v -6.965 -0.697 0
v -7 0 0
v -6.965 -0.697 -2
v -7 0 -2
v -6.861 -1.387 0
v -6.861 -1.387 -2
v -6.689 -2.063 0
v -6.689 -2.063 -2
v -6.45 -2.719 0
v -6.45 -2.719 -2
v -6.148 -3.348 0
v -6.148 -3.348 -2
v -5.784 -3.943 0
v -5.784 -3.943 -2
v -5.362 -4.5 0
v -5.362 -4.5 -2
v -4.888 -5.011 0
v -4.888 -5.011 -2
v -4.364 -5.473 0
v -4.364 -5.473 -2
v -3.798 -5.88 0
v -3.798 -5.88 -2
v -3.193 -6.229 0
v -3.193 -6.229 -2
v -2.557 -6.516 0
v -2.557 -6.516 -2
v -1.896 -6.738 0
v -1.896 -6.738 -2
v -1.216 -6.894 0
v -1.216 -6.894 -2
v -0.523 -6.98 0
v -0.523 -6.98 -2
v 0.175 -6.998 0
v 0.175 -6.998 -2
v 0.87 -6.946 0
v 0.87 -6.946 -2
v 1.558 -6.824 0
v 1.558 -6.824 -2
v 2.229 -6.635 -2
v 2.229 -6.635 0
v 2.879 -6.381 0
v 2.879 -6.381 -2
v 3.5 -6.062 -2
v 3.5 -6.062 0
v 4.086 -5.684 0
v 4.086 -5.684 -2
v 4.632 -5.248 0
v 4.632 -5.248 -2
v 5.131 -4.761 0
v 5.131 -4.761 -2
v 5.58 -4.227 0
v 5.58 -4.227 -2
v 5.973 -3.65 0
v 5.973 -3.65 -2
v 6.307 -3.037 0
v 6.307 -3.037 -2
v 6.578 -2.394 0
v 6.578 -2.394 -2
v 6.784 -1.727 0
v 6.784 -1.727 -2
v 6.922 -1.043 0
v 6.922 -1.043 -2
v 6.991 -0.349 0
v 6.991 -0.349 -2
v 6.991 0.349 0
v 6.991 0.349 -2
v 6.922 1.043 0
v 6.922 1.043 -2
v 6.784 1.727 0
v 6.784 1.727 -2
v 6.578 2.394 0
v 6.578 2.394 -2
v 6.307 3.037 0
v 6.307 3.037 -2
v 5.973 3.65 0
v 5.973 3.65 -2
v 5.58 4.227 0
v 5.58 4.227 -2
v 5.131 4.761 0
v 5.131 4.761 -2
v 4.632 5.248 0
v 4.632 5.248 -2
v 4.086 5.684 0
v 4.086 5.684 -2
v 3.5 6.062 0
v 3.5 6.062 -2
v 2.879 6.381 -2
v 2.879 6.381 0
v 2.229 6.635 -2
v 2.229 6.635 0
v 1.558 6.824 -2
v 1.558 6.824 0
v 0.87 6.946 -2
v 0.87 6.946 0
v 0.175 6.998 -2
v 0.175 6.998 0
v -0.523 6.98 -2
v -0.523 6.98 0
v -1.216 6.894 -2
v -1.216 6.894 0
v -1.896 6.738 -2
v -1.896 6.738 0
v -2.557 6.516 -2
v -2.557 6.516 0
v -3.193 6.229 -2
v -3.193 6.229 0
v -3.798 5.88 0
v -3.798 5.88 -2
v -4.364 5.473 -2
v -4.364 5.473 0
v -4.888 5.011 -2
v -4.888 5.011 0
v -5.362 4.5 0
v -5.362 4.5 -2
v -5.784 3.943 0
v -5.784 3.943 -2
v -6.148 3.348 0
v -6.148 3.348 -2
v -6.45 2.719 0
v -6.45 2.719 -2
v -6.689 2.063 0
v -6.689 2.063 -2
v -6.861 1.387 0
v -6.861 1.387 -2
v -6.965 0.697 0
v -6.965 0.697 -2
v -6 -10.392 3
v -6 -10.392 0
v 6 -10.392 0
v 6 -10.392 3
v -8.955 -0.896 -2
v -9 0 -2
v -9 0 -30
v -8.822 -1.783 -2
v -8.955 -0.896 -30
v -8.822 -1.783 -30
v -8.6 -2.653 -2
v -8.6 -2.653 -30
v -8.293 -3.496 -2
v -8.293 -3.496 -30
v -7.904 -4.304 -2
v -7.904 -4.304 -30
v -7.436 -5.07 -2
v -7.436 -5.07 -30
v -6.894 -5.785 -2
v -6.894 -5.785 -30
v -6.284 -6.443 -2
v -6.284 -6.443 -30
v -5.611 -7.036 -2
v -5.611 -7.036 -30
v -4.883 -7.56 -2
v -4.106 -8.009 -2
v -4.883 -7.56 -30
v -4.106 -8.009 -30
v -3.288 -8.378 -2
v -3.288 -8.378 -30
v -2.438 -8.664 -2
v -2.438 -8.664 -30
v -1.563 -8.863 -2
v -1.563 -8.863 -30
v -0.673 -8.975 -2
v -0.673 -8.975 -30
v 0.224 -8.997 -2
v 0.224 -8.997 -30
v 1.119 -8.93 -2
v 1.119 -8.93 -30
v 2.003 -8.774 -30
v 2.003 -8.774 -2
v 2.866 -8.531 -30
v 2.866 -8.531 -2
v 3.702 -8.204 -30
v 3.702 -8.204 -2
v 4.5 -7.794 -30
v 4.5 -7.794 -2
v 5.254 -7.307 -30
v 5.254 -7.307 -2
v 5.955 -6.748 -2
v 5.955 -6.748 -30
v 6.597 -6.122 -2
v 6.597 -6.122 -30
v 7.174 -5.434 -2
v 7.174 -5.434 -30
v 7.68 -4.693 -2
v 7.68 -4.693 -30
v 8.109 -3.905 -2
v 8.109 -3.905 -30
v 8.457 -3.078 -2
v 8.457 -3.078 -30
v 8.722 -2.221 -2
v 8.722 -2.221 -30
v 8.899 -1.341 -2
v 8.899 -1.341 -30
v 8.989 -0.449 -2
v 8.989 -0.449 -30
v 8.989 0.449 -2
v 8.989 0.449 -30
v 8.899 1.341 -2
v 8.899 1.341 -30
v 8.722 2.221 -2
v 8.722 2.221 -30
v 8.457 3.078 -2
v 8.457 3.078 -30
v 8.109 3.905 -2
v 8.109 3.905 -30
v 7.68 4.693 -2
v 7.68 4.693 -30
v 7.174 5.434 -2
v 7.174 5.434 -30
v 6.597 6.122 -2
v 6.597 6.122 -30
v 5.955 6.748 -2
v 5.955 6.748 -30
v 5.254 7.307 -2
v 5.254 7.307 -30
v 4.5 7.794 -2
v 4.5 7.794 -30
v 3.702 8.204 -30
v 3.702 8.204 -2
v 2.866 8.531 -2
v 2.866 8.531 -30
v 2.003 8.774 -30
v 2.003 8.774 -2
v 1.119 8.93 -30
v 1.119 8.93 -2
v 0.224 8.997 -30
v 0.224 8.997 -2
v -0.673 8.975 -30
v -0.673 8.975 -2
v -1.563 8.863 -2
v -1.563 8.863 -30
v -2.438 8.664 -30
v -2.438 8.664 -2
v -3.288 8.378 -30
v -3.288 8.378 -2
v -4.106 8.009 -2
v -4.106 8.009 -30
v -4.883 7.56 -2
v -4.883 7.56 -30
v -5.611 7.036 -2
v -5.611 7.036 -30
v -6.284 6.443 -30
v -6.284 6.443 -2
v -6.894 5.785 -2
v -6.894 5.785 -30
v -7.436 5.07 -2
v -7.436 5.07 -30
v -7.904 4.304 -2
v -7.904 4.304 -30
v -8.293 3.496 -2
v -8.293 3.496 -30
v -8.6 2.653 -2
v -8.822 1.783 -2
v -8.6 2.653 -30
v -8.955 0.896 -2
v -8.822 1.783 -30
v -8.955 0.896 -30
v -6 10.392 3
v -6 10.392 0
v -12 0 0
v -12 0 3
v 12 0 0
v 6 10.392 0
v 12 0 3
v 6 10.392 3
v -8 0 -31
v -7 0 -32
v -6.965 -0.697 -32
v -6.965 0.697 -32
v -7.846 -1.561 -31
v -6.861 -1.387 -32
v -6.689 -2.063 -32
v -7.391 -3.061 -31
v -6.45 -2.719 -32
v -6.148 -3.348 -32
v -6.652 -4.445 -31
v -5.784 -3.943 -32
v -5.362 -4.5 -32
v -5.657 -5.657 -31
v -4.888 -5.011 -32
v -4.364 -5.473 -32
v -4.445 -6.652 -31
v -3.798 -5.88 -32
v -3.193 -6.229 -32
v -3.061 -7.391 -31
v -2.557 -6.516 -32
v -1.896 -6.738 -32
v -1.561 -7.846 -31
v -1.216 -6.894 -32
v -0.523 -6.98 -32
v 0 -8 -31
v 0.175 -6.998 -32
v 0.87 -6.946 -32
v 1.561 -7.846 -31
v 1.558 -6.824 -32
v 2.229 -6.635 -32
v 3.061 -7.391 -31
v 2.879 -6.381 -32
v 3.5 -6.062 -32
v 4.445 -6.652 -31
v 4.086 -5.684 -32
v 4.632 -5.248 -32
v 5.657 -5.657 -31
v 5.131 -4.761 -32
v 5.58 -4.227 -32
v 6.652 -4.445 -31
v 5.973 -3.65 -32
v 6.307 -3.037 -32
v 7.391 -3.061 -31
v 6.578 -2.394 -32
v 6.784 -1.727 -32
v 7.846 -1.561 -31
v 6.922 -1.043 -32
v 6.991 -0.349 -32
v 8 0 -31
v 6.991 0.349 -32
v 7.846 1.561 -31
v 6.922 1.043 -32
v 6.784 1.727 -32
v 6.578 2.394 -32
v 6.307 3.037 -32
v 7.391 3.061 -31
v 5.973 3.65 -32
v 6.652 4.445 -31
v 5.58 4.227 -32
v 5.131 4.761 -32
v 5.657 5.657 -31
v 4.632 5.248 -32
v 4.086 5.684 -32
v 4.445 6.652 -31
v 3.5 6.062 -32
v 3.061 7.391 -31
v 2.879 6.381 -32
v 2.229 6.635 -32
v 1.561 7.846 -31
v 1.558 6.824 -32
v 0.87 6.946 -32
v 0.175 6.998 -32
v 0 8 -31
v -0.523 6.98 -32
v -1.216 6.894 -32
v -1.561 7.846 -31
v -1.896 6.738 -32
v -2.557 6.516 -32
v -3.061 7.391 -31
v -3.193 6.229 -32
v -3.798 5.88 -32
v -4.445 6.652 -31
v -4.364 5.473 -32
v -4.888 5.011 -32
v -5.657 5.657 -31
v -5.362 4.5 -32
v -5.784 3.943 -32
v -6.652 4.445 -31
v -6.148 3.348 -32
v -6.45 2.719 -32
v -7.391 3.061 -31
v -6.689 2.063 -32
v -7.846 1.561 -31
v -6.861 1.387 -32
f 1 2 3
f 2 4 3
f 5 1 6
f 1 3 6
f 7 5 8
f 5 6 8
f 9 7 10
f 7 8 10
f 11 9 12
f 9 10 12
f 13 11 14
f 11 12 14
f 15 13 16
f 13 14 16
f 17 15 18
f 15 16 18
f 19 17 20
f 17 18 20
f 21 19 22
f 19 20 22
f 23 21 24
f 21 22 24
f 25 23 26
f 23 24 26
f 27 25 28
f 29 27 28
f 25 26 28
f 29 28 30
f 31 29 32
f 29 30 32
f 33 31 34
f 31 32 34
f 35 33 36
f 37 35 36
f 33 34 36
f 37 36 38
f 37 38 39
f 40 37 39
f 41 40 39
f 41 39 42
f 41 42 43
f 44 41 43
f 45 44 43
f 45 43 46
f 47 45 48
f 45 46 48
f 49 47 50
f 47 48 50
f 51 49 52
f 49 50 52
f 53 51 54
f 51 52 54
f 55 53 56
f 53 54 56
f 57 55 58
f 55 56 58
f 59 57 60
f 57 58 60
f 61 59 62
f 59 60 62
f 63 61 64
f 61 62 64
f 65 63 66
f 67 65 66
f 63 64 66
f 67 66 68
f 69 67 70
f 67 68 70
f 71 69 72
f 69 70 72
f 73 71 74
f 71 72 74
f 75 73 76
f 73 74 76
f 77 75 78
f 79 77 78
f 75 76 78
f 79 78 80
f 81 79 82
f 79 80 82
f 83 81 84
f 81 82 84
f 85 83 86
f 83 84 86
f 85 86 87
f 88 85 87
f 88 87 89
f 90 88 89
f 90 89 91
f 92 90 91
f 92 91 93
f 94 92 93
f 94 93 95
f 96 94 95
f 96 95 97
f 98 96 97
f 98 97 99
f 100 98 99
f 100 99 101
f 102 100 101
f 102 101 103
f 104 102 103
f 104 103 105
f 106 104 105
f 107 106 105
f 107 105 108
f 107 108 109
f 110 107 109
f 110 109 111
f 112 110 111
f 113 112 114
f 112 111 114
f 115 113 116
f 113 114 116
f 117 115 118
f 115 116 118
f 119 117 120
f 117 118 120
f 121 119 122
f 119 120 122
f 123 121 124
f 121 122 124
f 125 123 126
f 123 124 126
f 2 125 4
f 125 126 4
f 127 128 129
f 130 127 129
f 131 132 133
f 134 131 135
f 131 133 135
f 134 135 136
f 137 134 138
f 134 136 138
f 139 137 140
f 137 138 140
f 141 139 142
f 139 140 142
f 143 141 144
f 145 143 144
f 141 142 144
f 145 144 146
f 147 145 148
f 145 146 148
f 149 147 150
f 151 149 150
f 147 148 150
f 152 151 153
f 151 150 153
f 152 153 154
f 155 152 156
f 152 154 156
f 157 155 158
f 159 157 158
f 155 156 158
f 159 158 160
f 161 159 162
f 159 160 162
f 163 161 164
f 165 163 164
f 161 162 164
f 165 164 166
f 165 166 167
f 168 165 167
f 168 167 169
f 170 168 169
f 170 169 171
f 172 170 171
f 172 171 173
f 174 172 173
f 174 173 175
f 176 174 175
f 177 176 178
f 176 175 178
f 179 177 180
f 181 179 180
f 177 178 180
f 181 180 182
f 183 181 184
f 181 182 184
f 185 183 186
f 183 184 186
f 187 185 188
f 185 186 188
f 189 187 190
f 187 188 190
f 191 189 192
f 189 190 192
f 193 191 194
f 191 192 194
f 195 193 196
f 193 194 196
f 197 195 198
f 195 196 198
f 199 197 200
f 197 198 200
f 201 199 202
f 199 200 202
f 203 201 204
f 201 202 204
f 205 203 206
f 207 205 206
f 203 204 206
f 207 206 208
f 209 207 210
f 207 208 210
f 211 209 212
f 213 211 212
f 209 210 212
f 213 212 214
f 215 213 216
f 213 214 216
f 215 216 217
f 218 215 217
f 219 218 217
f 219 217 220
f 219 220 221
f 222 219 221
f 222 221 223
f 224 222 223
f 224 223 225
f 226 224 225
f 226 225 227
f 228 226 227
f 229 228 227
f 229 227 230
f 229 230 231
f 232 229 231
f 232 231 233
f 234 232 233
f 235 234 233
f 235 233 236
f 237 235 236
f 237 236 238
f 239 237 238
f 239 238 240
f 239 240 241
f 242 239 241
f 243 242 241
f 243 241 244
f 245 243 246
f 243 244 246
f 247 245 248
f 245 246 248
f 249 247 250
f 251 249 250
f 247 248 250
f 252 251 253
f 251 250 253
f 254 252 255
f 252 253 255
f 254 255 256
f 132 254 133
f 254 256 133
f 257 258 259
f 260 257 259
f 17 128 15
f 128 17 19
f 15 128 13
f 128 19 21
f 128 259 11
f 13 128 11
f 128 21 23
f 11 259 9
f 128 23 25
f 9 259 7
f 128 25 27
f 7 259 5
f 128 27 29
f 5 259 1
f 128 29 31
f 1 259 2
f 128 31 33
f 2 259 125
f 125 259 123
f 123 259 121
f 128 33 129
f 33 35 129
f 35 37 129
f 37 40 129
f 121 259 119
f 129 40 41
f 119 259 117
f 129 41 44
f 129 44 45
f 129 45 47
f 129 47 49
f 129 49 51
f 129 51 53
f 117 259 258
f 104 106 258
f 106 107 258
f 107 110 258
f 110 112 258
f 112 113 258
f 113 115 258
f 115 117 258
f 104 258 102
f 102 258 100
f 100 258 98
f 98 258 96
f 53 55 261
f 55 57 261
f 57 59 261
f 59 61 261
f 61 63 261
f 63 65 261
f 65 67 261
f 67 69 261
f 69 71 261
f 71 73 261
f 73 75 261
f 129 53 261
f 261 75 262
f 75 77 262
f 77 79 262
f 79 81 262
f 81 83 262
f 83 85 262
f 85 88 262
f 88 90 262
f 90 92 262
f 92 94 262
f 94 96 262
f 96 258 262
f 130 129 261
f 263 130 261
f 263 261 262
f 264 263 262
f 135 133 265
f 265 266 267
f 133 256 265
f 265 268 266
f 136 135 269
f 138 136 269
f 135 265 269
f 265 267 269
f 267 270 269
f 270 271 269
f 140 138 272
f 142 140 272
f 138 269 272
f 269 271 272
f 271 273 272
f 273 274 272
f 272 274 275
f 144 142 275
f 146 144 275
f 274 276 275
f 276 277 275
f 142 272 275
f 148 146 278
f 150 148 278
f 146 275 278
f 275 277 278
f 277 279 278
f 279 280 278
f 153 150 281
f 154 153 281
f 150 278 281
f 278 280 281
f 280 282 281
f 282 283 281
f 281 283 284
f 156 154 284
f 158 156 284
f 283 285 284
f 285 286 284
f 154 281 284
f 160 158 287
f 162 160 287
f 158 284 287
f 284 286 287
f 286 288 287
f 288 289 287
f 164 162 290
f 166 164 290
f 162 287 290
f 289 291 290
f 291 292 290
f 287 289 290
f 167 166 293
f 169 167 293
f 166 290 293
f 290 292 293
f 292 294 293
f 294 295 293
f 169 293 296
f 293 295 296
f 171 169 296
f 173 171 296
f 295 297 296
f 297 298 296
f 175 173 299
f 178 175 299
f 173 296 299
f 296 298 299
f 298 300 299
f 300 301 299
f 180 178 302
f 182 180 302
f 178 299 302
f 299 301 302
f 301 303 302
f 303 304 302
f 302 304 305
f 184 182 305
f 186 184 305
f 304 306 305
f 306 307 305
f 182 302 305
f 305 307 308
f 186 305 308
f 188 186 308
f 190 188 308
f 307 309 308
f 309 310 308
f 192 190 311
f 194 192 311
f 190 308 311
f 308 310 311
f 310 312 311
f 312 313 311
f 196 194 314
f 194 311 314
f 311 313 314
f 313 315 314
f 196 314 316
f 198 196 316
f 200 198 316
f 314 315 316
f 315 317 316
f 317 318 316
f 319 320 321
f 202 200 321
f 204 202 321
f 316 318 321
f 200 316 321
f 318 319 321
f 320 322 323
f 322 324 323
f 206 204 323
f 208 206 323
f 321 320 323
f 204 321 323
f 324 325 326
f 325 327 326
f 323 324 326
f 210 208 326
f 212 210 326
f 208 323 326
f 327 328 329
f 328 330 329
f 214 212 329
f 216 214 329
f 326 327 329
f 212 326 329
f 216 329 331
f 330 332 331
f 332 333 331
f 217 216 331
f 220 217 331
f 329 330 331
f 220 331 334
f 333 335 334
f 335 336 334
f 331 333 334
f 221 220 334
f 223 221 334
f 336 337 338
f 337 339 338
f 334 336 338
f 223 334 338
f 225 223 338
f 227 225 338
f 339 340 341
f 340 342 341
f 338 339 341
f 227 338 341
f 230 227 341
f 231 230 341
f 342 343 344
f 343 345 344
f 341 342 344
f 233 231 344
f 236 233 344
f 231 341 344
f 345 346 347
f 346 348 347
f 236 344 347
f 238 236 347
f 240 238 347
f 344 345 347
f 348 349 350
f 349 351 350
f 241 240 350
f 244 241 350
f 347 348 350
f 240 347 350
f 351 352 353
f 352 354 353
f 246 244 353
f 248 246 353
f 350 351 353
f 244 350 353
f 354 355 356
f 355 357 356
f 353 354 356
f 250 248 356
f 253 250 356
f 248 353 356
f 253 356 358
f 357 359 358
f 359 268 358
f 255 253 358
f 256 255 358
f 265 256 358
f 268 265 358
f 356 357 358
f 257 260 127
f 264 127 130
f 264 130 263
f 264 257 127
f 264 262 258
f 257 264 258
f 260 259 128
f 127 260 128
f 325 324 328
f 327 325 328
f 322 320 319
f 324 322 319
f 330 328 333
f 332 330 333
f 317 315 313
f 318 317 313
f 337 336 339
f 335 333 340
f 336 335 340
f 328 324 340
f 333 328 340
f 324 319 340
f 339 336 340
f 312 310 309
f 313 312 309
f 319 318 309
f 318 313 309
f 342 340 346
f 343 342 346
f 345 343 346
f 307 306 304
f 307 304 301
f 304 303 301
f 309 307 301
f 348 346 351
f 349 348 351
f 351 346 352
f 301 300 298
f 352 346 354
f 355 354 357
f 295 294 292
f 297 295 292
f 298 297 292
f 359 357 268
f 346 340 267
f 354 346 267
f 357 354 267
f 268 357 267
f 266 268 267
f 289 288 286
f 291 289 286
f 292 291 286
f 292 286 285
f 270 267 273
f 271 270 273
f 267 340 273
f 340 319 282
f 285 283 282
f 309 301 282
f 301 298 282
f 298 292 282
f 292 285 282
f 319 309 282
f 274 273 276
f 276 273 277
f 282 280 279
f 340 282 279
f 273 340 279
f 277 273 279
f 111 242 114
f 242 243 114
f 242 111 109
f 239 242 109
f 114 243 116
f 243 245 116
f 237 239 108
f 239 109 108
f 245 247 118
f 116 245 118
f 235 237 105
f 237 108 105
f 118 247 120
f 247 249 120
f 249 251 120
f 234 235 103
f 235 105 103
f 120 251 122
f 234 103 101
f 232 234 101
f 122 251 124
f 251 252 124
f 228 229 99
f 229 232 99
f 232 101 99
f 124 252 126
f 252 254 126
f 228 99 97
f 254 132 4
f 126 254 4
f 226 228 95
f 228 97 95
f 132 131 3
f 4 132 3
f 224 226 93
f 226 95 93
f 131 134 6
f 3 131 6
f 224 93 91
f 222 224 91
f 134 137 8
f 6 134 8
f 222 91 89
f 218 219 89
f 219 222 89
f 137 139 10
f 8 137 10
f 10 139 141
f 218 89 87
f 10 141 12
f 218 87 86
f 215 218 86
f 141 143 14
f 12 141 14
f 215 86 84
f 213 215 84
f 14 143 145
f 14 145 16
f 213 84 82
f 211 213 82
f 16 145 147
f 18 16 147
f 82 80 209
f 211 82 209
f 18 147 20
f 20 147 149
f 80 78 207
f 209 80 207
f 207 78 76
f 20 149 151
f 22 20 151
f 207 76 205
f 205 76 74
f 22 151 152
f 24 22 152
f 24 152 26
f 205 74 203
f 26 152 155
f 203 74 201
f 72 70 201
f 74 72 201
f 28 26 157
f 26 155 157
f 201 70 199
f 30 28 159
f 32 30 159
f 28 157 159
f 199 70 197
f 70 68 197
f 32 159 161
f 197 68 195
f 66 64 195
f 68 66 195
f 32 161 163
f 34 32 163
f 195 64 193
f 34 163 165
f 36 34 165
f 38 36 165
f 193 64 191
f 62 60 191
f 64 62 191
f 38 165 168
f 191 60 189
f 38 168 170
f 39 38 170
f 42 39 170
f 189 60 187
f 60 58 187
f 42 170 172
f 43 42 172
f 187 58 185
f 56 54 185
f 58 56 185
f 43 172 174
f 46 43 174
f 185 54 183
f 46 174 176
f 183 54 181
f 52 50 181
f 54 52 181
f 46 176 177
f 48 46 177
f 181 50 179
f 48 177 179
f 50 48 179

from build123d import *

# Parameters (mm, degrees)
EXTRUDE_1_DEPTH     = 3
CUT_EXTRUDE_1_DEPTH = 39.366652187


with BuildPart() as part:
    # 草图1 → 凸台-拉伸1 (new body)
    with BuildSketch(Plane.XY):
        Polygon((16, 0), (8, 13.856406461), (-8, 13.856406461), (-16, 0), (-8, -13.856406461), (8, -13.856406461), align=None)
    extrude(amount=EXTRUDE_1_DEPTH)

    # 草图2 → 旋转1 (revolve)
    with BuildSketch(Plane(origin=(0, 0, 0), x_dir=(0, 0, -1), z_dir=(1, 0, 0)), mode=Mode.PRIVATE) as revolve_1_sk:
        Polygon((0, 0), (0, 7), (2, 7), (2, 9), (30, 9), (32, 7), (32, 0), align=None)
    revolve(revolve_1_sk.sketch.rotate(Axis((0, 0, -32), (0, 0, 1)), 90), axis=Axis((0, 0, -32), (0, 0, 1)))

    # 草图4 → 切除-拉伸1 (cut, through all)
    with BuildSketch(Plane.XY):
        Polygon((16, 0), (8, 13.856406461), (-8, 13.856406461), (-16, 0), (-8, -13.856406461), (8, -13.856406461), align=None)
        Polygon((12, 0), (6, 10.392304845), (-6, 10.392304845), (-12, 0), (-6, -10.392304845), (6, -10.392304845), align=None, mode=Mode.SUBTRACT)
    extrude(amount=CUT_EXTRUDE_1_DEPTH, mode=Mode.SUBTRACT)


solid = part.part
